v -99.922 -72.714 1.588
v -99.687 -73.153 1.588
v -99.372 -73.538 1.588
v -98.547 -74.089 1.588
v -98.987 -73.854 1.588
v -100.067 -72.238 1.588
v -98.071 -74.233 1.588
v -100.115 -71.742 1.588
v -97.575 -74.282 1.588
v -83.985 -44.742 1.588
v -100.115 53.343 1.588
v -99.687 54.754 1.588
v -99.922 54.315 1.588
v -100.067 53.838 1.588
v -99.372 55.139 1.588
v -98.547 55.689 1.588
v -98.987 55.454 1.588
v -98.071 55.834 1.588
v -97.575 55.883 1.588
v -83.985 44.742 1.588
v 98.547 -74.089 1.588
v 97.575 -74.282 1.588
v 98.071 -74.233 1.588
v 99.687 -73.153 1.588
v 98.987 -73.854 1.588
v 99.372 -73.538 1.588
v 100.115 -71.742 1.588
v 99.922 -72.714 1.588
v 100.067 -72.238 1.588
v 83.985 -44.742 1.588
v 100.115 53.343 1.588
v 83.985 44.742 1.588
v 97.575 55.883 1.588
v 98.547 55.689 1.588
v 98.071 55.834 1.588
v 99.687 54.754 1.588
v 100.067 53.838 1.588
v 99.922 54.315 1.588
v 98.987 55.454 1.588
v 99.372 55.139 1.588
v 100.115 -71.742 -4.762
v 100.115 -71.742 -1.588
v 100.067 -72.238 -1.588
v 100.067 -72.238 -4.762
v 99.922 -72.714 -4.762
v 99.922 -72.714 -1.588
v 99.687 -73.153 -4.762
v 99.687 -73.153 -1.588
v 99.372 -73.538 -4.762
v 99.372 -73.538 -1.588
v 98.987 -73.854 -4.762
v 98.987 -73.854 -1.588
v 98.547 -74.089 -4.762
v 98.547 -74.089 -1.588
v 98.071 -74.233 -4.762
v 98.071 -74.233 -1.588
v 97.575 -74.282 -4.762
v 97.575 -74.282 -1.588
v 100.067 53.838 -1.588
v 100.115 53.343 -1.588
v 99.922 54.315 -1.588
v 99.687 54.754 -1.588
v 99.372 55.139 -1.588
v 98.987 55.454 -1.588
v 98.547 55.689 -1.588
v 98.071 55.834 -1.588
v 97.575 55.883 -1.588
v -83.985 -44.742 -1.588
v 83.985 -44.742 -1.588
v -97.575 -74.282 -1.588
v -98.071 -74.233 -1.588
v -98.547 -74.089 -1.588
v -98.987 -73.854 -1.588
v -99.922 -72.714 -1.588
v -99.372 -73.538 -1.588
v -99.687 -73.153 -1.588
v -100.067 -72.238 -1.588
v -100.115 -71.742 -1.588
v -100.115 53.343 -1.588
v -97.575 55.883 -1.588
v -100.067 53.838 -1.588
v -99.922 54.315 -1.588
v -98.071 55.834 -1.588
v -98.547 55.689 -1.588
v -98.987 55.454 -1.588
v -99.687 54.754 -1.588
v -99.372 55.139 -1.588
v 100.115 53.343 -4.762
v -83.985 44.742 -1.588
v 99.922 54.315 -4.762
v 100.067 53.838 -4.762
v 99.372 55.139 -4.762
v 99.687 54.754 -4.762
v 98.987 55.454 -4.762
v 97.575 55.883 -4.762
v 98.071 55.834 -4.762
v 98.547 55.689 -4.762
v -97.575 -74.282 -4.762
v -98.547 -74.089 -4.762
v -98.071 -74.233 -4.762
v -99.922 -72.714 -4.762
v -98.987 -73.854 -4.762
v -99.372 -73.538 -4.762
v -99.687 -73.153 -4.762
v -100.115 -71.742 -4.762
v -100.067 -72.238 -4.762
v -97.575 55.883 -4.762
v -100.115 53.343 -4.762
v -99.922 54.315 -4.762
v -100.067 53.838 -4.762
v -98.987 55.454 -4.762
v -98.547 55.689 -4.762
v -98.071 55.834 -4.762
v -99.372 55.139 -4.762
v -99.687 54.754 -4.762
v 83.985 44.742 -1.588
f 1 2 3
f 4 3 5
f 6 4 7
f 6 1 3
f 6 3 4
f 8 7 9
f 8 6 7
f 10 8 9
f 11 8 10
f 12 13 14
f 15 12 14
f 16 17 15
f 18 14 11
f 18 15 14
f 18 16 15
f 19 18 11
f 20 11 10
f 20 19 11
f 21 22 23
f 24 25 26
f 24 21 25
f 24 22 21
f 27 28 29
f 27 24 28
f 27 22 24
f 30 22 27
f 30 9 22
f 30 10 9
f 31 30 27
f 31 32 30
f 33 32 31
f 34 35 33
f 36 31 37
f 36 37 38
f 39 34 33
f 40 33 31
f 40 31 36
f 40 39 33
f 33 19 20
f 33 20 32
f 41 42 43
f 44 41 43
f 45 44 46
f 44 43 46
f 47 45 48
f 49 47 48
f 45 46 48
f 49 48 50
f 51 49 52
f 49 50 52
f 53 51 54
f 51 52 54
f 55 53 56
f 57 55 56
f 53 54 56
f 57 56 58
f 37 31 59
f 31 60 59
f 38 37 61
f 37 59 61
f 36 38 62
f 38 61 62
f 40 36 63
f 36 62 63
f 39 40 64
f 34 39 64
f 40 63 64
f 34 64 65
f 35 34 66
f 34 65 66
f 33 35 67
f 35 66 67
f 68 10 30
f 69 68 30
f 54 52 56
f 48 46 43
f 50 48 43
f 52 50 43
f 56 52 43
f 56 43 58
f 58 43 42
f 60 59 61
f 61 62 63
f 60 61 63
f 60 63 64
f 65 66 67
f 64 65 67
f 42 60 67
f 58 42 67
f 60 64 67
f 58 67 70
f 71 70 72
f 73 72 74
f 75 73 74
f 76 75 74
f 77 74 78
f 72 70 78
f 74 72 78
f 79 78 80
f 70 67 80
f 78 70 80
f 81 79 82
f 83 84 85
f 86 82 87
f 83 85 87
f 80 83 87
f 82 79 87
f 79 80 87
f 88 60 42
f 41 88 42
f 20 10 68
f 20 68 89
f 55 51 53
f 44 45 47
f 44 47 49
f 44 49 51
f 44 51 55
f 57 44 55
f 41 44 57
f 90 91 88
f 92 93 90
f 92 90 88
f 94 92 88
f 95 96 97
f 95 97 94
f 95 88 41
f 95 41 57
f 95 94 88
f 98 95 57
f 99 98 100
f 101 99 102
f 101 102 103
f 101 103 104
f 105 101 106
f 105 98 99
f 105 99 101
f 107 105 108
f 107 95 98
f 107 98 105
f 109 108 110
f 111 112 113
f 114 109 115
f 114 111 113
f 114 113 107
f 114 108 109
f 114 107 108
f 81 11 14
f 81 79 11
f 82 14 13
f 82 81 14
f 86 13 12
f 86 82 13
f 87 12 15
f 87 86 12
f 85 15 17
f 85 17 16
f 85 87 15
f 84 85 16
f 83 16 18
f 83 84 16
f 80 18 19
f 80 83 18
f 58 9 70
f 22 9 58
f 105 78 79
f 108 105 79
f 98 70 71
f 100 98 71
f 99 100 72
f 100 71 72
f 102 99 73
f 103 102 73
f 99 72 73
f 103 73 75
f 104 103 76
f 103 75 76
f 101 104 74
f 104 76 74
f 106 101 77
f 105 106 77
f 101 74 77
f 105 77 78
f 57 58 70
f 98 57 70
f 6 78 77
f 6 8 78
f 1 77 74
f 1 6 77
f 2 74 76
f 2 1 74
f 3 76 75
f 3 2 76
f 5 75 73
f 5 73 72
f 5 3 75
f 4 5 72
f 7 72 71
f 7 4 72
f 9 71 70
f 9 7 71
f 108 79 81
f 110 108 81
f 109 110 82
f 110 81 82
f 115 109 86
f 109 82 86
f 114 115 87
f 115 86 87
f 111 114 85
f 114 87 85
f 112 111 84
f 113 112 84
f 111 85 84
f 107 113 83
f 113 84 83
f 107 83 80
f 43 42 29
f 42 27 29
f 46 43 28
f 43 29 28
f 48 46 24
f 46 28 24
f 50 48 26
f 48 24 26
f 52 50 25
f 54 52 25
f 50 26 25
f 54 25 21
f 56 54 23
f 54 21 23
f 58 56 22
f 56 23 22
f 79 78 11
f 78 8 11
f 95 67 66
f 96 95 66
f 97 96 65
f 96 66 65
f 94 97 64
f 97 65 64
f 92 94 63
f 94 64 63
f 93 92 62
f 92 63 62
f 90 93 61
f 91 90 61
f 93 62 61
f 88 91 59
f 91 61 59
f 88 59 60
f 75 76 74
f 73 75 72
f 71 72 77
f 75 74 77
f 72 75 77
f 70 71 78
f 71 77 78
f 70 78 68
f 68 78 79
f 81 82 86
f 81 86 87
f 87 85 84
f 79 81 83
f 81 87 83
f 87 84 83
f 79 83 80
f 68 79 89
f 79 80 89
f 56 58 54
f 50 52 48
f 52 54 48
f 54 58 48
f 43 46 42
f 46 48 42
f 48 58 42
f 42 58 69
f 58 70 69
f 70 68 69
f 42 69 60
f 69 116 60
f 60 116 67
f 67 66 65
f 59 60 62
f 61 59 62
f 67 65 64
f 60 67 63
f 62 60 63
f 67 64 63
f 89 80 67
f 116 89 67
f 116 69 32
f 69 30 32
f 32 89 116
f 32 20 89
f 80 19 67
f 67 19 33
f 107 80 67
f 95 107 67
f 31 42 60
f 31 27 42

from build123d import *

# Parameters (mm, degrees)
SKETCH1_W           = 200.230919124
SKETCH1_H           = 130.164702166
SKETCH1_W_2         = 167.9702
SKETCH1_H_2         = 89.484454
BOSS_EXTRUDE1_DEPTH = 1.5875
FILLET1_R           = 2.54
BOSS_EXTRUDE2_DEPTH = 3.175


with BuildPart() as part:
    # Sketch1 → Boss-Extrude1 (new, symmetric)
    with BuildSketch(Plane.XY):
        with Locations((0, -9.199836276)):
            Rectangle(SKETCH1_W, SKETCH1_H)
        Rectangle(SKETCH1_W_2, SKETCH1_H_2, mode=Mode.SUBTRACT)
    extrude(amount=BOSS_EXTRUDE1_DEPTH, both=True)

    # Fillet1
    fillet1_edges = [part.edges().sort_by_distance(p)[0] for p in [
        (-100.115459562, 55.882514807, 0),
        (100.115459562, 55.882514807, 0),
        (100.115459562, -74.282187359, 0),
        (-100.115459562, -74.282187359, 0),
    ]]
    fillet(fillet1_edges, radius=FILLET1_R)


with BuildPart() as body_2:
    # Sketch2 → Boss-Extrude2 (new body)
    with BuildSketch(Plane(origin=(0, 0, -1.5875), x_dir=(-1, 0, 0), z_dir=(0, 0, -1))):
        with BuildLine():
            Line((100.115459562, -71.742187359), (100.115459562, 53.342514807))
            ThreePointArc((100.115459562, 53.342514807), (99.371510786, 55.138566032), (97.575459562, 55.882514807))
            Line((97.575459562, 55.882514807), (-97.575459562, 55.882514807))
            ThreePointArc((-97.575459562, 55.882514807), (-99.371510786, 55.138566032), (-100.115459562, 53.342514807))
            Line((-100.115459562, 53.342514807), (-100.115459562, -71.742187359))
            ThreePointArc((-100.115459562, -71.742187359), (-99.371510786, -73.538238583), (-97.575459562, -74.282187359))
            Line((-97.575459562, -74.282187359), (97.575459562, -74.282187359))
            ThreePointArc((97.575459562, -74.282187359), (99.371510786, -73.538238583), (100.115459562, -71.742187359))
        make_face()
    extrude(amount=BOSS_EXTRUDE2_DEPTH)


solid = Compound([part.part, body_2.part])
